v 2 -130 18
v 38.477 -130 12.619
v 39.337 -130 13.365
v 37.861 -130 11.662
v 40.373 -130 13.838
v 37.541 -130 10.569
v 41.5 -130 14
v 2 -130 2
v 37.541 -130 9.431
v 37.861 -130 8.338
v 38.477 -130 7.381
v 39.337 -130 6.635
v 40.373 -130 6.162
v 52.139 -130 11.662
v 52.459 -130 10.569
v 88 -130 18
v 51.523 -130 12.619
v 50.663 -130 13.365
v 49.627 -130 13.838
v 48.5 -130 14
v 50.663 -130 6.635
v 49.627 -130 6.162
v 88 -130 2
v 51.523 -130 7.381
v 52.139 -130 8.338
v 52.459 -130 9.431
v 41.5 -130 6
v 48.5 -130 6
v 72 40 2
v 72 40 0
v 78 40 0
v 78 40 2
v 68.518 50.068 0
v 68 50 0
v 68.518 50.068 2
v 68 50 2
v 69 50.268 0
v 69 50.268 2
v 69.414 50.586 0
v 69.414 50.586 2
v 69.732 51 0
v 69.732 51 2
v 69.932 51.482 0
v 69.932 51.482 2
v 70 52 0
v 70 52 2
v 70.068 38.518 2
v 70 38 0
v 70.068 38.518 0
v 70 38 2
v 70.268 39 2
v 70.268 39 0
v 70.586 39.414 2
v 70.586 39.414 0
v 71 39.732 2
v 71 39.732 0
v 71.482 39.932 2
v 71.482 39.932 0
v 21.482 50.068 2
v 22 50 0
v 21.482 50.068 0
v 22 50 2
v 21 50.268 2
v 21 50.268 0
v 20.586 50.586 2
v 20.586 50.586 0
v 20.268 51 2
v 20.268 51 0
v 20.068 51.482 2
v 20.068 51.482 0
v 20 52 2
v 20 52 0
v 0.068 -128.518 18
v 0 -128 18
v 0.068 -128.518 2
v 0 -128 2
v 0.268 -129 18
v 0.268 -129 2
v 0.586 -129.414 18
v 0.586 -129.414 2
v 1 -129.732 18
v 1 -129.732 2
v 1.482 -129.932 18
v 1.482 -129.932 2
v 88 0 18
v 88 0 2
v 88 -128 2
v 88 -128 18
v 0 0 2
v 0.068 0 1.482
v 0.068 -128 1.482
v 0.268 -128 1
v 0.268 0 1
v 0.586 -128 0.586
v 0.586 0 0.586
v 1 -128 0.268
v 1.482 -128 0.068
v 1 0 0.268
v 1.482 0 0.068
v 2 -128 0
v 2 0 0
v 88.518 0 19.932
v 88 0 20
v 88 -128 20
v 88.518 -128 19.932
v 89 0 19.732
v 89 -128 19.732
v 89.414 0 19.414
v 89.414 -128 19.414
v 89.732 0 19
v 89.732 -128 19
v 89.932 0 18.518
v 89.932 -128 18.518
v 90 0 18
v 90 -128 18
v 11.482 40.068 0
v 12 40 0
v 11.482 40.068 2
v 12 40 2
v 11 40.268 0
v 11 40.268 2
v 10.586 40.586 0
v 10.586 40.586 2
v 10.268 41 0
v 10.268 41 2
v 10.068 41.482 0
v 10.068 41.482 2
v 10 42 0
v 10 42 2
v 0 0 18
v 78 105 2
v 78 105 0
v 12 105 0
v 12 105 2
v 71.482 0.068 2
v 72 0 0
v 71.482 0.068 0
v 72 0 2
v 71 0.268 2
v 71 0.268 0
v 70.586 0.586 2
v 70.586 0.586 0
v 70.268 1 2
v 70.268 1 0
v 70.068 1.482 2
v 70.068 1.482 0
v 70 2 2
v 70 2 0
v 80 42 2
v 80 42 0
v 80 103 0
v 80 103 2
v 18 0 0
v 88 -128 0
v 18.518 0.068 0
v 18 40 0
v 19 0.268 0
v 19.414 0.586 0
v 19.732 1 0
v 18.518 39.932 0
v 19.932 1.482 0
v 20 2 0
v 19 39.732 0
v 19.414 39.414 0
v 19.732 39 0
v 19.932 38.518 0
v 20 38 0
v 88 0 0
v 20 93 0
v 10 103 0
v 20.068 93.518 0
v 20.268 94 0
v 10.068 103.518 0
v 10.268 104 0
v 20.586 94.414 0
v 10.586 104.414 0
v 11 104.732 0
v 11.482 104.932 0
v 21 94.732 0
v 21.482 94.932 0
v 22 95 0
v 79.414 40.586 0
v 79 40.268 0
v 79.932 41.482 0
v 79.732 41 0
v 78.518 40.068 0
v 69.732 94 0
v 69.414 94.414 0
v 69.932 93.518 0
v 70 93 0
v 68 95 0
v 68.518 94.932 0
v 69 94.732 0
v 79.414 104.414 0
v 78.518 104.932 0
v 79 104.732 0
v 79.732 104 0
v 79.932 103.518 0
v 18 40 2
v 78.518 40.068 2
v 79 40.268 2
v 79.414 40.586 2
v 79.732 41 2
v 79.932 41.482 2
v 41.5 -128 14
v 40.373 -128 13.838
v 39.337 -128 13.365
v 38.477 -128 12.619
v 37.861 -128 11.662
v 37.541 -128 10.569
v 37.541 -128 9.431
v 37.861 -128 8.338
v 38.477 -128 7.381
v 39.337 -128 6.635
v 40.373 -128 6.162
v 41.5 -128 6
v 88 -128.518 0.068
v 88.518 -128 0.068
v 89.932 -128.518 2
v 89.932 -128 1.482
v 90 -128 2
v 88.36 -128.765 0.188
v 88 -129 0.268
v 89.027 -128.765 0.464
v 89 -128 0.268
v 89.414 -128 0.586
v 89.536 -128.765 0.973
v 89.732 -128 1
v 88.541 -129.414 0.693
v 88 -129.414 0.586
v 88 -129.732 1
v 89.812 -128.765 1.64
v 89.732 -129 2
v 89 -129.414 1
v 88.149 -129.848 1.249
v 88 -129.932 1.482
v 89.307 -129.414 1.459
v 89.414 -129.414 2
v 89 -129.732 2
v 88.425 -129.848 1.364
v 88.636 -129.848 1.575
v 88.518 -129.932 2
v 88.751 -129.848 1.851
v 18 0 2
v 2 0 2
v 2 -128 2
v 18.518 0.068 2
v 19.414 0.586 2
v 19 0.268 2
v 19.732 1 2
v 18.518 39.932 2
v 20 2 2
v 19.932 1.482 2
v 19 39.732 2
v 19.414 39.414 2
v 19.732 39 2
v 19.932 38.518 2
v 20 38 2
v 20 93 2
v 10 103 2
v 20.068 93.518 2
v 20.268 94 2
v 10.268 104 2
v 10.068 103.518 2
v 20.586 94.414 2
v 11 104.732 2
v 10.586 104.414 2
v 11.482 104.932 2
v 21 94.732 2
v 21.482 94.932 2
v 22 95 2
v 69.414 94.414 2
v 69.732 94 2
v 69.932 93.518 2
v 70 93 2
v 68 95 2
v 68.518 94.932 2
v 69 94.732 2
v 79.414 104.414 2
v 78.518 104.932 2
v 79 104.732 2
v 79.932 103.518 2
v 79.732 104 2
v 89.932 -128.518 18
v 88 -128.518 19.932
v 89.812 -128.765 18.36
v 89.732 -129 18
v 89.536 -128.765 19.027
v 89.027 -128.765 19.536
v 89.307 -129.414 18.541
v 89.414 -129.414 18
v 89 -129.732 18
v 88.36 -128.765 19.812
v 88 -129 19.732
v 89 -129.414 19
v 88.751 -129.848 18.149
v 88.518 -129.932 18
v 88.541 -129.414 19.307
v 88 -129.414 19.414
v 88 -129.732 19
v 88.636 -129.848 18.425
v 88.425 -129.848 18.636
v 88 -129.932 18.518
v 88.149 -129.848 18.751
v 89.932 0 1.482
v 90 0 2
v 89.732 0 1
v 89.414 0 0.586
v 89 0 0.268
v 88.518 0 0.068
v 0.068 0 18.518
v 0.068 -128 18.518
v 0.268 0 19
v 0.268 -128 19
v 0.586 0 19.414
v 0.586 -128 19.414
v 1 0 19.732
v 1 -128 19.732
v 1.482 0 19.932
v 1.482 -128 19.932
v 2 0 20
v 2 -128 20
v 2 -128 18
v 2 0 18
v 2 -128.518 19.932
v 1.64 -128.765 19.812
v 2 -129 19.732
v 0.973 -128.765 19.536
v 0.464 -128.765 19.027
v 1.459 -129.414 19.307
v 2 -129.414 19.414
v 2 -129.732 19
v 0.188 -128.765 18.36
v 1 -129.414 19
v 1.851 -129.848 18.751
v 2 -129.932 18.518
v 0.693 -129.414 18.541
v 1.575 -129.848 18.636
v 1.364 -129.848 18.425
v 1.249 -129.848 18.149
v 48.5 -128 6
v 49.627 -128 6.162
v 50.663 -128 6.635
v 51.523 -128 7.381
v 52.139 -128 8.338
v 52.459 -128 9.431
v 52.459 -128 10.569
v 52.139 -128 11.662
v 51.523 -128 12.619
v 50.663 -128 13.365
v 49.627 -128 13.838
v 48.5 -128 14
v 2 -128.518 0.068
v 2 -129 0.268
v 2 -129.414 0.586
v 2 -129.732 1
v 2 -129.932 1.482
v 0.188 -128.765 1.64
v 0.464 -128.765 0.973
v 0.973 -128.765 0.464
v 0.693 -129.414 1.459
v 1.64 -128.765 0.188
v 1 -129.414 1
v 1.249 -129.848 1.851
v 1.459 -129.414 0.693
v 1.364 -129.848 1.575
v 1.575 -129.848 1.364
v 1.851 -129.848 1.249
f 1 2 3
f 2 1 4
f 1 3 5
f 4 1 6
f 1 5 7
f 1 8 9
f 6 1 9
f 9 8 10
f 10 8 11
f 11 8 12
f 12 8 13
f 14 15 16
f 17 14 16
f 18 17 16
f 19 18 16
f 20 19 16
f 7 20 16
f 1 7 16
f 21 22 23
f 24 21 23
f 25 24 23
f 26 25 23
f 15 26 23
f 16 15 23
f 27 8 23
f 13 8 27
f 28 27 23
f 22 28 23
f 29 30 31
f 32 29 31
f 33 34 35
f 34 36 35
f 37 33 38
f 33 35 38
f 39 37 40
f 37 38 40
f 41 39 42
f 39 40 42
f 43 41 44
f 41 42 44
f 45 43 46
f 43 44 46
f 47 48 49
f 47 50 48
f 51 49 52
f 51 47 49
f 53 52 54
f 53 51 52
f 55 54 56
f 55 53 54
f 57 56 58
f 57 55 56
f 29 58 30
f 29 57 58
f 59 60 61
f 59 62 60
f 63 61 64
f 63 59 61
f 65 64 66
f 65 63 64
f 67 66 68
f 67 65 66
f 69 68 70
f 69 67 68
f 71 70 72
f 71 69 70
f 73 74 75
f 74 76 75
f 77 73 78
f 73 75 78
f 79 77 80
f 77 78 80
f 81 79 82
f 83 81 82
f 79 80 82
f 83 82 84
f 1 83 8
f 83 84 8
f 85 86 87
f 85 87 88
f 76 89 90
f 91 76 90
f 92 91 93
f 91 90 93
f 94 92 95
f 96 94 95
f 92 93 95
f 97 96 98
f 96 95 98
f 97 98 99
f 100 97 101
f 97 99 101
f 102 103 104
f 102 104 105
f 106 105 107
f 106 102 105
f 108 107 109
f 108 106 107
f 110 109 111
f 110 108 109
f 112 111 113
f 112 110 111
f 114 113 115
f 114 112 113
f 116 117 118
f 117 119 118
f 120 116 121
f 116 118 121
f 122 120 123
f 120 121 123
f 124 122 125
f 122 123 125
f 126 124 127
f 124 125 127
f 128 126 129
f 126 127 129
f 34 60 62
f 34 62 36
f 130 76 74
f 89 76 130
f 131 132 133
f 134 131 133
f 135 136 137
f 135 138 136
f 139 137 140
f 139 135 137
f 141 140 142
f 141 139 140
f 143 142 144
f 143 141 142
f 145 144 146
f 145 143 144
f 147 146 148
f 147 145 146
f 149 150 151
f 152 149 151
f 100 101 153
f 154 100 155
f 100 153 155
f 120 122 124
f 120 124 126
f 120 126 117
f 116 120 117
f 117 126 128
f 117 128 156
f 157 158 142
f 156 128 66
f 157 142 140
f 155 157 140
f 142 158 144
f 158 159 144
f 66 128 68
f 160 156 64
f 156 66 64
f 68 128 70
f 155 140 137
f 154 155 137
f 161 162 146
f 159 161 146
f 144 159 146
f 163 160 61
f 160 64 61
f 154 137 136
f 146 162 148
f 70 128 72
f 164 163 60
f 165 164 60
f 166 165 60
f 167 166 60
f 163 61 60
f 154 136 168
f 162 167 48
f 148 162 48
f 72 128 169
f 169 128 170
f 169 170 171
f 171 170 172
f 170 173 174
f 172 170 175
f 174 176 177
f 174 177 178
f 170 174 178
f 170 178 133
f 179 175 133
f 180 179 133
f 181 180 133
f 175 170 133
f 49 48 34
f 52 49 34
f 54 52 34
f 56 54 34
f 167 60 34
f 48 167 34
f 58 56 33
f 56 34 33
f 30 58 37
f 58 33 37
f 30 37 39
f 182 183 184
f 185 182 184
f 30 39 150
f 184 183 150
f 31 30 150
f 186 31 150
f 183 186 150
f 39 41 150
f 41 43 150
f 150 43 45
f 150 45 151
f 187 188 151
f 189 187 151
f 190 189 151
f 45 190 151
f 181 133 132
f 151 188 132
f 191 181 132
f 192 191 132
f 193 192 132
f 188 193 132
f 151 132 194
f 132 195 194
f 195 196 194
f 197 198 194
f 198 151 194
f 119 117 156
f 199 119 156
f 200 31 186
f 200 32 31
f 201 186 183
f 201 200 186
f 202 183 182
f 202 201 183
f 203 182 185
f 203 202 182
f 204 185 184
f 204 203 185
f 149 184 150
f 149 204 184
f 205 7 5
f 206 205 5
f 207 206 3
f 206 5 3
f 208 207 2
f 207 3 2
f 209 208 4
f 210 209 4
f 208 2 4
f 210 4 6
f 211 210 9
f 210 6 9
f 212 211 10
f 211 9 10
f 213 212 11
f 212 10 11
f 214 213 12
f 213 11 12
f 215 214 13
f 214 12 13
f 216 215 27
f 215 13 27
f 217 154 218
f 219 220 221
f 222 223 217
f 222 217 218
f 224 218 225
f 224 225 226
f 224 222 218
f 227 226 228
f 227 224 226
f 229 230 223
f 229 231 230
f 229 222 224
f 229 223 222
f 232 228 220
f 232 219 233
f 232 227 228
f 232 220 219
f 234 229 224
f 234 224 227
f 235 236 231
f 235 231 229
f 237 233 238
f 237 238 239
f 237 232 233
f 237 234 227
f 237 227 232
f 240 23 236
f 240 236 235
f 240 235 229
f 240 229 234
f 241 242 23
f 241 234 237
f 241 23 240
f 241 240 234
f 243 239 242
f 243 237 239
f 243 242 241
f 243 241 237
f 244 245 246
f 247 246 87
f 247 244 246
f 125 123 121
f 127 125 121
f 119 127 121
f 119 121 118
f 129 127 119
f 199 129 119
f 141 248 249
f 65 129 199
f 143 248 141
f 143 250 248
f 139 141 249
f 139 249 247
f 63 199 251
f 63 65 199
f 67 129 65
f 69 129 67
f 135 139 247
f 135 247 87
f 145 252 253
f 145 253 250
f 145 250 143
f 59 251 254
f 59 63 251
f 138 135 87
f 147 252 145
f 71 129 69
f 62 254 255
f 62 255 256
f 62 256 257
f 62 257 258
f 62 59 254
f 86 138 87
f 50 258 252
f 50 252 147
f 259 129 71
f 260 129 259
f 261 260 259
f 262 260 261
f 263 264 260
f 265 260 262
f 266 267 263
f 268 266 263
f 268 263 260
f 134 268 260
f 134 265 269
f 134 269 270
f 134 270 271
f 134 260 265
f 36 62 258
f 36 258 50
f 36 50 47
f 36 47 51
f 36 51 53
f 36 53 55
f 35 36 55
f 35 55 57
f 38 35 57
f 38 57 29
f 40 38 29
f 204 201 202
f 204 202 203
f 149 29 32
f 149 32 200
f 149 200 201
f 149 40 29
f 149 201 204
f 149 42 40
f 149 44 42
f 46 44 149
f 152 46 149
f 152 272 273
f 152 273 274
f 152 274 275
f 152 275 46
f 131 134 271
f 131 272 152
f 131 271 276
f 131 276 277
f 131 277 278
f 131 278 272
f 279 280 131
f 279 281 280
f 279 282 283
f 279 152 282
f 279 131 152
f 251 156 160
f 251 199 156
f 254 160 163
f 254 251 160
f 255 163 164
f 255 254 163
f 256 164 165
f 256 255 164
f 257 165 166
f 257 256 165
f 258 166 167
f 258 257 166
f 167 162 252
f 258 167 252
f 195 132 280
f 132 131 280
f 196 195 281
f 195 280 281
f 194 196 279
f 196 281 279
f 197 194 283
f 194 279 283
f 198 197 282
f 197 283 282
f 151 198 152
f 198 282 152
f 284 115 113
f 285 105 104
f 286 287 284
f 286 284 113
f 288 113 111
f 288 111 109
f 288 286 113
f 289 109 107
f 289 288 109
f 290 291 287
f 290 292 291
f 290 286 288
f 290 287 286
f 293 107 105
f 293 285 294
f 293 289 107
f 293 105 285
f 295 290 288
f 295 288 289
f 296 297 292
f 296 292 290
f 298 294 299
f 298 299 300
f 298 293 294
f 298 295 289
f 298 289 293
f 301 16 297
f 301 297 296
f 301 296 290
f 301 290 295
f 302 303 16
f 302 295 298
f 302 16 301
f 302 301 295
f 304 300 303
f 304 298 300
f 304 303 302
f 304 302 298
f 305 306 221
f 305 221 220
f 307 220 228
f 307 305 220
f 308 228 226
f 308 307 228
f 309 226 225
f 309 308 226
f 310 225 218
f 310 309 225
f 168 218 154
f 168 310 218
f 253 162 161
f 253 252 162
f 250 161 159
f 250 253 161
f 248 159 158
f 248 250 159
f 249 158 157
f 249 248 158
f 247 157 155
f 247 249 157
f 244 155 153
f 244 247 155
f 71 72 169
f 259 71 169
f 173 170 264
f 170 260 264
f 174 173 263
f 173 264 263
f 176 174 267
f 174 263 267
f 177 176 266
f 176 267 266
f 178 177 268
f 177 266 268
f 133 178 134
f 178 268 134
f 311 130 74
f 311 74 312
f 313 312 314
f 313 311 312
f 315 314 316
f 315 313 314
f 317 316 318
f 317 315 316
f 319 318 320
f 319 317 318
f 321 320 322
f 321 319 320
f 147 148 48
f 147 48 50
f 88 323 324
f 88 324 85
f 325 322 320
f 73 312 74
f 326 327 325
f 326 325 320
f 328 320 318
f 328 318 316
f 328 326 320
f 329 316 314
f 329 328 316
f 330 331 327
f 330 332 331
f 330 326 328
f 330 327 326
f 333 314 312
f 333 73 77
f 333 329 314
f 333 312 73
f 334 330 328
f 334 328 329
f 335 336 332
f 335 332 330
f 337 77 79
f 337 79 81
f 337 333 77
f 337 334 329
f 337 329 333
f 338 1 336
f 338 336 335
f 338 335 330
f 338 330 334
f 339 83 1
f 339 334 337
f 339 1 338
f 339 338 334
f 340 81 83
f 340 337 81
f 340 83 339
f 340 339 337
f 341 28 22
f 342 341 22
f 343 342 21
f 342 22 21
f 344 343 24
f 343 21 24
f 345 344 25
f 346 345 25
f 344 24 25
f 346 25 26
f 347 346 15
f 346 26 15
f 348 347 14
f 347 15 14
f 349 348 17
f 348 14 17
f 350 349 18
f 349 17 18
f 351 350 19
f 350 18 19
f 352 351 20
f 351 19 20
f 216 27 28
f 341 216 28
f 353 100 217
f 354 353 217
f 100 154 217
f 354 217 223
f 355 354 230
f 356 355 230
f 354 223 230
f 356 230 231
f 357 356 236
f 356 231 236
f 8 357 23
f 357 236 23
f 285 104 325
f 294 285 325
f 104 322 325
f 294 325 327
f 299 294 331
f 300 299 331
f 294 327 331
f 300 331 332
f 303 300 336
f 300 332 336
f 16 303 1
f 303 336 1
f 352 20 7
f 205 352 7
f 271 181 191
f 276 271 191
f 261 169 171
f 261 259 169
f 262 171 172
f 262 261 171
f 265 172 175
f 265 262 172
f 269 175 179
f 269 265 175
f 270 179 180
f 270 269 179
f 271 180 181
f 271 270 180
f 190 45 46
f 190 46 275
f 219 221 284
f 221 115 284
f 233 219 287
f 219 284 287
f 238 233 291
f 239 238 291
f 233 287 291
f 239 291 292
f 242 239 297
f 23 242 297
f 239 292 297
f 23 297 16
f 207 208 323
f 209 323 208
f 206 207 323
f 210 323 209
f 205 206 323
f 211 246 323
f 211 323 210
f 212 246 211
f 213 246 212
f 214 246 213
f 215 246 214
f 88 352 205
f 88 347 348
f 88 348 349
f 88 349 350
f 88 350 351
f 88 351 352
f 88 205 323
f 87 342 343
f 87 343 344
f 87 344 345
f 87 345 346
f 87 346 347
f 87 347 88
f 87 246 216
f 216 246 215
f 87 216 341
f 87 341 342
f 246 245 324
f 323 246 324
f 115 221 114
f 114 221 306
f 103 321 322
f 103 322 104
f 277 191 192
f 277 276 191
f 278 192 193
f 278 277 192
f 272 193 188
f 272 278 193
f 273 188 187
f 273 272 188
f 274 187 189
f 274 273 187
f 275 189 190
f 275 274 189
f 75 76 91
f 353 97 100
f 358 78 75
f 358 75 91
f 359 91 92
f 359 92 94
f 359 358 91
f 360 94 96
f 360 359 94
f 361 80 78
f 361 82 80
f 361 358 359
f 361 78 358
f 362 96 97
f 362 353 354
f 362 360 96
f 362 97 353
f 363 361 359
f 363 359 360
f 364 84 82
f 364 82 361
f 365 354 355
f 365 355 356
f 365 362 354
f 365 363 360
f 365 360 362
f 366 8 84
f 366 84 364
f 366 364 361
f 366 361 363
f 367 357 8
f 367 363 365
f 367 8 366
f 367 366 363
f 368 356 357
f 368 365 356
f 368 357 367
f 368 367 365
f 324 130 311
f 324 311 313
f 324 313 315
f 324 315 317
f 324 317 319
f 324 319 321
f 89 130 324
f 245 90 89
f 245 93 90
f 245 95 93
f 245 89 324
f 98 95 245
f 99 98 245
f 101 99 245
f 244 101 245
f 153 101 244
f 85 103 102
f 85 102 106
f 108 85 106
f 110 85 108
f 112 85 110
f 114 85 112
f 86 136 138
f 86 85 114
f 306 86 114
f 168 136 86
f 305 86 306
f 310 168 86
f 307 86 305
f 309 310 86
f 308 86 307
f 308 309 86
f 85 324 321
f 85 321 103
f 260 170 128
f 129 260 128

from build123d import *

# Parameters (mm, degrees)
F0_W      = 90
F0_H      = 130
F1_DEPTH  = 20
F2_W      = 50
F2_H      = 2
F3_DEPTH  = 40
F4_W      = 50
F4_H      = 45
F5_DEPTH  = 2
F6_T      = -2
F7_R      = 2
F8_R      = 2
F9_R      = 2
F10_R     = 2
F11_R     = 2
F13_DEPTH = 25


# Not quite as in the source:
# - a shell that OpenCascade refuses in one call is made with other operations: the cavity is built on its own and cut out


with BuildPart() as f1:
    # F0 (on Top) → F1 (new body)
    with BuildSketch(Plane.XY):
        with Locations((45, -65)):
            Rectangle(F0_W, F0_H)
    extrude(amount=F1_DEPTH)

    # F2 (on face) → F3 (join)
    with BuildSketch(Plane(origin=(0, 0, 0), x_dir=(-1, 0, 0), z_dir=(0, 1, 0))):
        with Locations((-45, 1)):
            Rectangle(F2_W, F2_H)
    extrude(amount=F3_DEPTH)

    # F4 (on Top) → F5 (join)
    with BuildSketch(Plane.XY):
        Polygon((20, 40), (70, 40), (80, 40), (80, 105), (10, 105), (10, 40), align=None)
        with Locations((45, 72.5)):
            Rectangle(F4_W, F4_H, mode=Mode.SUBTRACT)
    extrude(amount=F5_DEPTH)

    # F6: a shell. OpenCascade refuses it in one call, so the cavity is built on its own and cut out:
    # the body offset inwards by the wall thickness, plus a prism from it out through each open face.
    f6_core = offset(f1.part, amount=F6_T, kind=Kind.INTERSECTION, mode=Mode.PRIVATE)
    f6_exits = [f6_core.faces().sort_by_distance(p)[0] for p in [
        (45, -2, 10),
    ]]
    add(f6_core, mode=Mode.SUBTRACT)
    extrude(f6_exits, amount=-F6_T, mode=Mode.SUBTRACT)

    # F7
    f7_edges = [f1.edges().sort_by_distance(p)[0] for p in [
        (0, -65, 20),
        (90, -65, 20),
        (90, -65, 0),
        (0, -65, 0),
    ]]
    fillet(f7_edges, radius=F7_R)

    # F8
    f8_edges = [f1.edges().sort_by_distance(p)[0] for p in [
        (45, -130, 0),
    ]]
    fillet(f8_edges, radius=F8_R)

    # F9
    f9_edges = [f1.edges().sort_by_distance(p)[0] for p in [
        (10, 40, 1),
        (10, 105, 1),
        (80, 105, 1),
        (80, 40, 1),
    ]]
    fillet(f9_edges, radius=F9_R)

    # F10
    f10_edges = [f1.edges().sort_by_distance(p)[0] for p in [
        (20, 40, 1),
        (70, 40, 1),
        (70, 0, 1),
        (20, 0, 1),
    ]]
    fillet(f10_edges, radius=F10_R)

    # F11
    f11_edges = [f1.edges().sort_by_distance(p)[0] for p in [
        (20, 50, 1),
        (20, 95, 1),
        (70, 50, 1),
        (70, 95, 1),
    ]]
    fillet(f11_edges, radius=F11_R)

    # F12 (on face) → F13 (cut)
    with BuildSketch(Plane.XZ.offset(130)):
        with BuildLine():
            Line((48.5, 14), (41.5, 14))
            ThreePointArc((41.5, 14), (37.5, 10), (41.5, 6))
            Line((41.5, 6), (48.5, 6))
            ThreePointArc((48.5, 6), (52.5, 10), (48.5, 14))
        make_face()
    extrude(amount=-F13_DEPTH, mode=Mode.SUBTRACT)


solid = f1.part
